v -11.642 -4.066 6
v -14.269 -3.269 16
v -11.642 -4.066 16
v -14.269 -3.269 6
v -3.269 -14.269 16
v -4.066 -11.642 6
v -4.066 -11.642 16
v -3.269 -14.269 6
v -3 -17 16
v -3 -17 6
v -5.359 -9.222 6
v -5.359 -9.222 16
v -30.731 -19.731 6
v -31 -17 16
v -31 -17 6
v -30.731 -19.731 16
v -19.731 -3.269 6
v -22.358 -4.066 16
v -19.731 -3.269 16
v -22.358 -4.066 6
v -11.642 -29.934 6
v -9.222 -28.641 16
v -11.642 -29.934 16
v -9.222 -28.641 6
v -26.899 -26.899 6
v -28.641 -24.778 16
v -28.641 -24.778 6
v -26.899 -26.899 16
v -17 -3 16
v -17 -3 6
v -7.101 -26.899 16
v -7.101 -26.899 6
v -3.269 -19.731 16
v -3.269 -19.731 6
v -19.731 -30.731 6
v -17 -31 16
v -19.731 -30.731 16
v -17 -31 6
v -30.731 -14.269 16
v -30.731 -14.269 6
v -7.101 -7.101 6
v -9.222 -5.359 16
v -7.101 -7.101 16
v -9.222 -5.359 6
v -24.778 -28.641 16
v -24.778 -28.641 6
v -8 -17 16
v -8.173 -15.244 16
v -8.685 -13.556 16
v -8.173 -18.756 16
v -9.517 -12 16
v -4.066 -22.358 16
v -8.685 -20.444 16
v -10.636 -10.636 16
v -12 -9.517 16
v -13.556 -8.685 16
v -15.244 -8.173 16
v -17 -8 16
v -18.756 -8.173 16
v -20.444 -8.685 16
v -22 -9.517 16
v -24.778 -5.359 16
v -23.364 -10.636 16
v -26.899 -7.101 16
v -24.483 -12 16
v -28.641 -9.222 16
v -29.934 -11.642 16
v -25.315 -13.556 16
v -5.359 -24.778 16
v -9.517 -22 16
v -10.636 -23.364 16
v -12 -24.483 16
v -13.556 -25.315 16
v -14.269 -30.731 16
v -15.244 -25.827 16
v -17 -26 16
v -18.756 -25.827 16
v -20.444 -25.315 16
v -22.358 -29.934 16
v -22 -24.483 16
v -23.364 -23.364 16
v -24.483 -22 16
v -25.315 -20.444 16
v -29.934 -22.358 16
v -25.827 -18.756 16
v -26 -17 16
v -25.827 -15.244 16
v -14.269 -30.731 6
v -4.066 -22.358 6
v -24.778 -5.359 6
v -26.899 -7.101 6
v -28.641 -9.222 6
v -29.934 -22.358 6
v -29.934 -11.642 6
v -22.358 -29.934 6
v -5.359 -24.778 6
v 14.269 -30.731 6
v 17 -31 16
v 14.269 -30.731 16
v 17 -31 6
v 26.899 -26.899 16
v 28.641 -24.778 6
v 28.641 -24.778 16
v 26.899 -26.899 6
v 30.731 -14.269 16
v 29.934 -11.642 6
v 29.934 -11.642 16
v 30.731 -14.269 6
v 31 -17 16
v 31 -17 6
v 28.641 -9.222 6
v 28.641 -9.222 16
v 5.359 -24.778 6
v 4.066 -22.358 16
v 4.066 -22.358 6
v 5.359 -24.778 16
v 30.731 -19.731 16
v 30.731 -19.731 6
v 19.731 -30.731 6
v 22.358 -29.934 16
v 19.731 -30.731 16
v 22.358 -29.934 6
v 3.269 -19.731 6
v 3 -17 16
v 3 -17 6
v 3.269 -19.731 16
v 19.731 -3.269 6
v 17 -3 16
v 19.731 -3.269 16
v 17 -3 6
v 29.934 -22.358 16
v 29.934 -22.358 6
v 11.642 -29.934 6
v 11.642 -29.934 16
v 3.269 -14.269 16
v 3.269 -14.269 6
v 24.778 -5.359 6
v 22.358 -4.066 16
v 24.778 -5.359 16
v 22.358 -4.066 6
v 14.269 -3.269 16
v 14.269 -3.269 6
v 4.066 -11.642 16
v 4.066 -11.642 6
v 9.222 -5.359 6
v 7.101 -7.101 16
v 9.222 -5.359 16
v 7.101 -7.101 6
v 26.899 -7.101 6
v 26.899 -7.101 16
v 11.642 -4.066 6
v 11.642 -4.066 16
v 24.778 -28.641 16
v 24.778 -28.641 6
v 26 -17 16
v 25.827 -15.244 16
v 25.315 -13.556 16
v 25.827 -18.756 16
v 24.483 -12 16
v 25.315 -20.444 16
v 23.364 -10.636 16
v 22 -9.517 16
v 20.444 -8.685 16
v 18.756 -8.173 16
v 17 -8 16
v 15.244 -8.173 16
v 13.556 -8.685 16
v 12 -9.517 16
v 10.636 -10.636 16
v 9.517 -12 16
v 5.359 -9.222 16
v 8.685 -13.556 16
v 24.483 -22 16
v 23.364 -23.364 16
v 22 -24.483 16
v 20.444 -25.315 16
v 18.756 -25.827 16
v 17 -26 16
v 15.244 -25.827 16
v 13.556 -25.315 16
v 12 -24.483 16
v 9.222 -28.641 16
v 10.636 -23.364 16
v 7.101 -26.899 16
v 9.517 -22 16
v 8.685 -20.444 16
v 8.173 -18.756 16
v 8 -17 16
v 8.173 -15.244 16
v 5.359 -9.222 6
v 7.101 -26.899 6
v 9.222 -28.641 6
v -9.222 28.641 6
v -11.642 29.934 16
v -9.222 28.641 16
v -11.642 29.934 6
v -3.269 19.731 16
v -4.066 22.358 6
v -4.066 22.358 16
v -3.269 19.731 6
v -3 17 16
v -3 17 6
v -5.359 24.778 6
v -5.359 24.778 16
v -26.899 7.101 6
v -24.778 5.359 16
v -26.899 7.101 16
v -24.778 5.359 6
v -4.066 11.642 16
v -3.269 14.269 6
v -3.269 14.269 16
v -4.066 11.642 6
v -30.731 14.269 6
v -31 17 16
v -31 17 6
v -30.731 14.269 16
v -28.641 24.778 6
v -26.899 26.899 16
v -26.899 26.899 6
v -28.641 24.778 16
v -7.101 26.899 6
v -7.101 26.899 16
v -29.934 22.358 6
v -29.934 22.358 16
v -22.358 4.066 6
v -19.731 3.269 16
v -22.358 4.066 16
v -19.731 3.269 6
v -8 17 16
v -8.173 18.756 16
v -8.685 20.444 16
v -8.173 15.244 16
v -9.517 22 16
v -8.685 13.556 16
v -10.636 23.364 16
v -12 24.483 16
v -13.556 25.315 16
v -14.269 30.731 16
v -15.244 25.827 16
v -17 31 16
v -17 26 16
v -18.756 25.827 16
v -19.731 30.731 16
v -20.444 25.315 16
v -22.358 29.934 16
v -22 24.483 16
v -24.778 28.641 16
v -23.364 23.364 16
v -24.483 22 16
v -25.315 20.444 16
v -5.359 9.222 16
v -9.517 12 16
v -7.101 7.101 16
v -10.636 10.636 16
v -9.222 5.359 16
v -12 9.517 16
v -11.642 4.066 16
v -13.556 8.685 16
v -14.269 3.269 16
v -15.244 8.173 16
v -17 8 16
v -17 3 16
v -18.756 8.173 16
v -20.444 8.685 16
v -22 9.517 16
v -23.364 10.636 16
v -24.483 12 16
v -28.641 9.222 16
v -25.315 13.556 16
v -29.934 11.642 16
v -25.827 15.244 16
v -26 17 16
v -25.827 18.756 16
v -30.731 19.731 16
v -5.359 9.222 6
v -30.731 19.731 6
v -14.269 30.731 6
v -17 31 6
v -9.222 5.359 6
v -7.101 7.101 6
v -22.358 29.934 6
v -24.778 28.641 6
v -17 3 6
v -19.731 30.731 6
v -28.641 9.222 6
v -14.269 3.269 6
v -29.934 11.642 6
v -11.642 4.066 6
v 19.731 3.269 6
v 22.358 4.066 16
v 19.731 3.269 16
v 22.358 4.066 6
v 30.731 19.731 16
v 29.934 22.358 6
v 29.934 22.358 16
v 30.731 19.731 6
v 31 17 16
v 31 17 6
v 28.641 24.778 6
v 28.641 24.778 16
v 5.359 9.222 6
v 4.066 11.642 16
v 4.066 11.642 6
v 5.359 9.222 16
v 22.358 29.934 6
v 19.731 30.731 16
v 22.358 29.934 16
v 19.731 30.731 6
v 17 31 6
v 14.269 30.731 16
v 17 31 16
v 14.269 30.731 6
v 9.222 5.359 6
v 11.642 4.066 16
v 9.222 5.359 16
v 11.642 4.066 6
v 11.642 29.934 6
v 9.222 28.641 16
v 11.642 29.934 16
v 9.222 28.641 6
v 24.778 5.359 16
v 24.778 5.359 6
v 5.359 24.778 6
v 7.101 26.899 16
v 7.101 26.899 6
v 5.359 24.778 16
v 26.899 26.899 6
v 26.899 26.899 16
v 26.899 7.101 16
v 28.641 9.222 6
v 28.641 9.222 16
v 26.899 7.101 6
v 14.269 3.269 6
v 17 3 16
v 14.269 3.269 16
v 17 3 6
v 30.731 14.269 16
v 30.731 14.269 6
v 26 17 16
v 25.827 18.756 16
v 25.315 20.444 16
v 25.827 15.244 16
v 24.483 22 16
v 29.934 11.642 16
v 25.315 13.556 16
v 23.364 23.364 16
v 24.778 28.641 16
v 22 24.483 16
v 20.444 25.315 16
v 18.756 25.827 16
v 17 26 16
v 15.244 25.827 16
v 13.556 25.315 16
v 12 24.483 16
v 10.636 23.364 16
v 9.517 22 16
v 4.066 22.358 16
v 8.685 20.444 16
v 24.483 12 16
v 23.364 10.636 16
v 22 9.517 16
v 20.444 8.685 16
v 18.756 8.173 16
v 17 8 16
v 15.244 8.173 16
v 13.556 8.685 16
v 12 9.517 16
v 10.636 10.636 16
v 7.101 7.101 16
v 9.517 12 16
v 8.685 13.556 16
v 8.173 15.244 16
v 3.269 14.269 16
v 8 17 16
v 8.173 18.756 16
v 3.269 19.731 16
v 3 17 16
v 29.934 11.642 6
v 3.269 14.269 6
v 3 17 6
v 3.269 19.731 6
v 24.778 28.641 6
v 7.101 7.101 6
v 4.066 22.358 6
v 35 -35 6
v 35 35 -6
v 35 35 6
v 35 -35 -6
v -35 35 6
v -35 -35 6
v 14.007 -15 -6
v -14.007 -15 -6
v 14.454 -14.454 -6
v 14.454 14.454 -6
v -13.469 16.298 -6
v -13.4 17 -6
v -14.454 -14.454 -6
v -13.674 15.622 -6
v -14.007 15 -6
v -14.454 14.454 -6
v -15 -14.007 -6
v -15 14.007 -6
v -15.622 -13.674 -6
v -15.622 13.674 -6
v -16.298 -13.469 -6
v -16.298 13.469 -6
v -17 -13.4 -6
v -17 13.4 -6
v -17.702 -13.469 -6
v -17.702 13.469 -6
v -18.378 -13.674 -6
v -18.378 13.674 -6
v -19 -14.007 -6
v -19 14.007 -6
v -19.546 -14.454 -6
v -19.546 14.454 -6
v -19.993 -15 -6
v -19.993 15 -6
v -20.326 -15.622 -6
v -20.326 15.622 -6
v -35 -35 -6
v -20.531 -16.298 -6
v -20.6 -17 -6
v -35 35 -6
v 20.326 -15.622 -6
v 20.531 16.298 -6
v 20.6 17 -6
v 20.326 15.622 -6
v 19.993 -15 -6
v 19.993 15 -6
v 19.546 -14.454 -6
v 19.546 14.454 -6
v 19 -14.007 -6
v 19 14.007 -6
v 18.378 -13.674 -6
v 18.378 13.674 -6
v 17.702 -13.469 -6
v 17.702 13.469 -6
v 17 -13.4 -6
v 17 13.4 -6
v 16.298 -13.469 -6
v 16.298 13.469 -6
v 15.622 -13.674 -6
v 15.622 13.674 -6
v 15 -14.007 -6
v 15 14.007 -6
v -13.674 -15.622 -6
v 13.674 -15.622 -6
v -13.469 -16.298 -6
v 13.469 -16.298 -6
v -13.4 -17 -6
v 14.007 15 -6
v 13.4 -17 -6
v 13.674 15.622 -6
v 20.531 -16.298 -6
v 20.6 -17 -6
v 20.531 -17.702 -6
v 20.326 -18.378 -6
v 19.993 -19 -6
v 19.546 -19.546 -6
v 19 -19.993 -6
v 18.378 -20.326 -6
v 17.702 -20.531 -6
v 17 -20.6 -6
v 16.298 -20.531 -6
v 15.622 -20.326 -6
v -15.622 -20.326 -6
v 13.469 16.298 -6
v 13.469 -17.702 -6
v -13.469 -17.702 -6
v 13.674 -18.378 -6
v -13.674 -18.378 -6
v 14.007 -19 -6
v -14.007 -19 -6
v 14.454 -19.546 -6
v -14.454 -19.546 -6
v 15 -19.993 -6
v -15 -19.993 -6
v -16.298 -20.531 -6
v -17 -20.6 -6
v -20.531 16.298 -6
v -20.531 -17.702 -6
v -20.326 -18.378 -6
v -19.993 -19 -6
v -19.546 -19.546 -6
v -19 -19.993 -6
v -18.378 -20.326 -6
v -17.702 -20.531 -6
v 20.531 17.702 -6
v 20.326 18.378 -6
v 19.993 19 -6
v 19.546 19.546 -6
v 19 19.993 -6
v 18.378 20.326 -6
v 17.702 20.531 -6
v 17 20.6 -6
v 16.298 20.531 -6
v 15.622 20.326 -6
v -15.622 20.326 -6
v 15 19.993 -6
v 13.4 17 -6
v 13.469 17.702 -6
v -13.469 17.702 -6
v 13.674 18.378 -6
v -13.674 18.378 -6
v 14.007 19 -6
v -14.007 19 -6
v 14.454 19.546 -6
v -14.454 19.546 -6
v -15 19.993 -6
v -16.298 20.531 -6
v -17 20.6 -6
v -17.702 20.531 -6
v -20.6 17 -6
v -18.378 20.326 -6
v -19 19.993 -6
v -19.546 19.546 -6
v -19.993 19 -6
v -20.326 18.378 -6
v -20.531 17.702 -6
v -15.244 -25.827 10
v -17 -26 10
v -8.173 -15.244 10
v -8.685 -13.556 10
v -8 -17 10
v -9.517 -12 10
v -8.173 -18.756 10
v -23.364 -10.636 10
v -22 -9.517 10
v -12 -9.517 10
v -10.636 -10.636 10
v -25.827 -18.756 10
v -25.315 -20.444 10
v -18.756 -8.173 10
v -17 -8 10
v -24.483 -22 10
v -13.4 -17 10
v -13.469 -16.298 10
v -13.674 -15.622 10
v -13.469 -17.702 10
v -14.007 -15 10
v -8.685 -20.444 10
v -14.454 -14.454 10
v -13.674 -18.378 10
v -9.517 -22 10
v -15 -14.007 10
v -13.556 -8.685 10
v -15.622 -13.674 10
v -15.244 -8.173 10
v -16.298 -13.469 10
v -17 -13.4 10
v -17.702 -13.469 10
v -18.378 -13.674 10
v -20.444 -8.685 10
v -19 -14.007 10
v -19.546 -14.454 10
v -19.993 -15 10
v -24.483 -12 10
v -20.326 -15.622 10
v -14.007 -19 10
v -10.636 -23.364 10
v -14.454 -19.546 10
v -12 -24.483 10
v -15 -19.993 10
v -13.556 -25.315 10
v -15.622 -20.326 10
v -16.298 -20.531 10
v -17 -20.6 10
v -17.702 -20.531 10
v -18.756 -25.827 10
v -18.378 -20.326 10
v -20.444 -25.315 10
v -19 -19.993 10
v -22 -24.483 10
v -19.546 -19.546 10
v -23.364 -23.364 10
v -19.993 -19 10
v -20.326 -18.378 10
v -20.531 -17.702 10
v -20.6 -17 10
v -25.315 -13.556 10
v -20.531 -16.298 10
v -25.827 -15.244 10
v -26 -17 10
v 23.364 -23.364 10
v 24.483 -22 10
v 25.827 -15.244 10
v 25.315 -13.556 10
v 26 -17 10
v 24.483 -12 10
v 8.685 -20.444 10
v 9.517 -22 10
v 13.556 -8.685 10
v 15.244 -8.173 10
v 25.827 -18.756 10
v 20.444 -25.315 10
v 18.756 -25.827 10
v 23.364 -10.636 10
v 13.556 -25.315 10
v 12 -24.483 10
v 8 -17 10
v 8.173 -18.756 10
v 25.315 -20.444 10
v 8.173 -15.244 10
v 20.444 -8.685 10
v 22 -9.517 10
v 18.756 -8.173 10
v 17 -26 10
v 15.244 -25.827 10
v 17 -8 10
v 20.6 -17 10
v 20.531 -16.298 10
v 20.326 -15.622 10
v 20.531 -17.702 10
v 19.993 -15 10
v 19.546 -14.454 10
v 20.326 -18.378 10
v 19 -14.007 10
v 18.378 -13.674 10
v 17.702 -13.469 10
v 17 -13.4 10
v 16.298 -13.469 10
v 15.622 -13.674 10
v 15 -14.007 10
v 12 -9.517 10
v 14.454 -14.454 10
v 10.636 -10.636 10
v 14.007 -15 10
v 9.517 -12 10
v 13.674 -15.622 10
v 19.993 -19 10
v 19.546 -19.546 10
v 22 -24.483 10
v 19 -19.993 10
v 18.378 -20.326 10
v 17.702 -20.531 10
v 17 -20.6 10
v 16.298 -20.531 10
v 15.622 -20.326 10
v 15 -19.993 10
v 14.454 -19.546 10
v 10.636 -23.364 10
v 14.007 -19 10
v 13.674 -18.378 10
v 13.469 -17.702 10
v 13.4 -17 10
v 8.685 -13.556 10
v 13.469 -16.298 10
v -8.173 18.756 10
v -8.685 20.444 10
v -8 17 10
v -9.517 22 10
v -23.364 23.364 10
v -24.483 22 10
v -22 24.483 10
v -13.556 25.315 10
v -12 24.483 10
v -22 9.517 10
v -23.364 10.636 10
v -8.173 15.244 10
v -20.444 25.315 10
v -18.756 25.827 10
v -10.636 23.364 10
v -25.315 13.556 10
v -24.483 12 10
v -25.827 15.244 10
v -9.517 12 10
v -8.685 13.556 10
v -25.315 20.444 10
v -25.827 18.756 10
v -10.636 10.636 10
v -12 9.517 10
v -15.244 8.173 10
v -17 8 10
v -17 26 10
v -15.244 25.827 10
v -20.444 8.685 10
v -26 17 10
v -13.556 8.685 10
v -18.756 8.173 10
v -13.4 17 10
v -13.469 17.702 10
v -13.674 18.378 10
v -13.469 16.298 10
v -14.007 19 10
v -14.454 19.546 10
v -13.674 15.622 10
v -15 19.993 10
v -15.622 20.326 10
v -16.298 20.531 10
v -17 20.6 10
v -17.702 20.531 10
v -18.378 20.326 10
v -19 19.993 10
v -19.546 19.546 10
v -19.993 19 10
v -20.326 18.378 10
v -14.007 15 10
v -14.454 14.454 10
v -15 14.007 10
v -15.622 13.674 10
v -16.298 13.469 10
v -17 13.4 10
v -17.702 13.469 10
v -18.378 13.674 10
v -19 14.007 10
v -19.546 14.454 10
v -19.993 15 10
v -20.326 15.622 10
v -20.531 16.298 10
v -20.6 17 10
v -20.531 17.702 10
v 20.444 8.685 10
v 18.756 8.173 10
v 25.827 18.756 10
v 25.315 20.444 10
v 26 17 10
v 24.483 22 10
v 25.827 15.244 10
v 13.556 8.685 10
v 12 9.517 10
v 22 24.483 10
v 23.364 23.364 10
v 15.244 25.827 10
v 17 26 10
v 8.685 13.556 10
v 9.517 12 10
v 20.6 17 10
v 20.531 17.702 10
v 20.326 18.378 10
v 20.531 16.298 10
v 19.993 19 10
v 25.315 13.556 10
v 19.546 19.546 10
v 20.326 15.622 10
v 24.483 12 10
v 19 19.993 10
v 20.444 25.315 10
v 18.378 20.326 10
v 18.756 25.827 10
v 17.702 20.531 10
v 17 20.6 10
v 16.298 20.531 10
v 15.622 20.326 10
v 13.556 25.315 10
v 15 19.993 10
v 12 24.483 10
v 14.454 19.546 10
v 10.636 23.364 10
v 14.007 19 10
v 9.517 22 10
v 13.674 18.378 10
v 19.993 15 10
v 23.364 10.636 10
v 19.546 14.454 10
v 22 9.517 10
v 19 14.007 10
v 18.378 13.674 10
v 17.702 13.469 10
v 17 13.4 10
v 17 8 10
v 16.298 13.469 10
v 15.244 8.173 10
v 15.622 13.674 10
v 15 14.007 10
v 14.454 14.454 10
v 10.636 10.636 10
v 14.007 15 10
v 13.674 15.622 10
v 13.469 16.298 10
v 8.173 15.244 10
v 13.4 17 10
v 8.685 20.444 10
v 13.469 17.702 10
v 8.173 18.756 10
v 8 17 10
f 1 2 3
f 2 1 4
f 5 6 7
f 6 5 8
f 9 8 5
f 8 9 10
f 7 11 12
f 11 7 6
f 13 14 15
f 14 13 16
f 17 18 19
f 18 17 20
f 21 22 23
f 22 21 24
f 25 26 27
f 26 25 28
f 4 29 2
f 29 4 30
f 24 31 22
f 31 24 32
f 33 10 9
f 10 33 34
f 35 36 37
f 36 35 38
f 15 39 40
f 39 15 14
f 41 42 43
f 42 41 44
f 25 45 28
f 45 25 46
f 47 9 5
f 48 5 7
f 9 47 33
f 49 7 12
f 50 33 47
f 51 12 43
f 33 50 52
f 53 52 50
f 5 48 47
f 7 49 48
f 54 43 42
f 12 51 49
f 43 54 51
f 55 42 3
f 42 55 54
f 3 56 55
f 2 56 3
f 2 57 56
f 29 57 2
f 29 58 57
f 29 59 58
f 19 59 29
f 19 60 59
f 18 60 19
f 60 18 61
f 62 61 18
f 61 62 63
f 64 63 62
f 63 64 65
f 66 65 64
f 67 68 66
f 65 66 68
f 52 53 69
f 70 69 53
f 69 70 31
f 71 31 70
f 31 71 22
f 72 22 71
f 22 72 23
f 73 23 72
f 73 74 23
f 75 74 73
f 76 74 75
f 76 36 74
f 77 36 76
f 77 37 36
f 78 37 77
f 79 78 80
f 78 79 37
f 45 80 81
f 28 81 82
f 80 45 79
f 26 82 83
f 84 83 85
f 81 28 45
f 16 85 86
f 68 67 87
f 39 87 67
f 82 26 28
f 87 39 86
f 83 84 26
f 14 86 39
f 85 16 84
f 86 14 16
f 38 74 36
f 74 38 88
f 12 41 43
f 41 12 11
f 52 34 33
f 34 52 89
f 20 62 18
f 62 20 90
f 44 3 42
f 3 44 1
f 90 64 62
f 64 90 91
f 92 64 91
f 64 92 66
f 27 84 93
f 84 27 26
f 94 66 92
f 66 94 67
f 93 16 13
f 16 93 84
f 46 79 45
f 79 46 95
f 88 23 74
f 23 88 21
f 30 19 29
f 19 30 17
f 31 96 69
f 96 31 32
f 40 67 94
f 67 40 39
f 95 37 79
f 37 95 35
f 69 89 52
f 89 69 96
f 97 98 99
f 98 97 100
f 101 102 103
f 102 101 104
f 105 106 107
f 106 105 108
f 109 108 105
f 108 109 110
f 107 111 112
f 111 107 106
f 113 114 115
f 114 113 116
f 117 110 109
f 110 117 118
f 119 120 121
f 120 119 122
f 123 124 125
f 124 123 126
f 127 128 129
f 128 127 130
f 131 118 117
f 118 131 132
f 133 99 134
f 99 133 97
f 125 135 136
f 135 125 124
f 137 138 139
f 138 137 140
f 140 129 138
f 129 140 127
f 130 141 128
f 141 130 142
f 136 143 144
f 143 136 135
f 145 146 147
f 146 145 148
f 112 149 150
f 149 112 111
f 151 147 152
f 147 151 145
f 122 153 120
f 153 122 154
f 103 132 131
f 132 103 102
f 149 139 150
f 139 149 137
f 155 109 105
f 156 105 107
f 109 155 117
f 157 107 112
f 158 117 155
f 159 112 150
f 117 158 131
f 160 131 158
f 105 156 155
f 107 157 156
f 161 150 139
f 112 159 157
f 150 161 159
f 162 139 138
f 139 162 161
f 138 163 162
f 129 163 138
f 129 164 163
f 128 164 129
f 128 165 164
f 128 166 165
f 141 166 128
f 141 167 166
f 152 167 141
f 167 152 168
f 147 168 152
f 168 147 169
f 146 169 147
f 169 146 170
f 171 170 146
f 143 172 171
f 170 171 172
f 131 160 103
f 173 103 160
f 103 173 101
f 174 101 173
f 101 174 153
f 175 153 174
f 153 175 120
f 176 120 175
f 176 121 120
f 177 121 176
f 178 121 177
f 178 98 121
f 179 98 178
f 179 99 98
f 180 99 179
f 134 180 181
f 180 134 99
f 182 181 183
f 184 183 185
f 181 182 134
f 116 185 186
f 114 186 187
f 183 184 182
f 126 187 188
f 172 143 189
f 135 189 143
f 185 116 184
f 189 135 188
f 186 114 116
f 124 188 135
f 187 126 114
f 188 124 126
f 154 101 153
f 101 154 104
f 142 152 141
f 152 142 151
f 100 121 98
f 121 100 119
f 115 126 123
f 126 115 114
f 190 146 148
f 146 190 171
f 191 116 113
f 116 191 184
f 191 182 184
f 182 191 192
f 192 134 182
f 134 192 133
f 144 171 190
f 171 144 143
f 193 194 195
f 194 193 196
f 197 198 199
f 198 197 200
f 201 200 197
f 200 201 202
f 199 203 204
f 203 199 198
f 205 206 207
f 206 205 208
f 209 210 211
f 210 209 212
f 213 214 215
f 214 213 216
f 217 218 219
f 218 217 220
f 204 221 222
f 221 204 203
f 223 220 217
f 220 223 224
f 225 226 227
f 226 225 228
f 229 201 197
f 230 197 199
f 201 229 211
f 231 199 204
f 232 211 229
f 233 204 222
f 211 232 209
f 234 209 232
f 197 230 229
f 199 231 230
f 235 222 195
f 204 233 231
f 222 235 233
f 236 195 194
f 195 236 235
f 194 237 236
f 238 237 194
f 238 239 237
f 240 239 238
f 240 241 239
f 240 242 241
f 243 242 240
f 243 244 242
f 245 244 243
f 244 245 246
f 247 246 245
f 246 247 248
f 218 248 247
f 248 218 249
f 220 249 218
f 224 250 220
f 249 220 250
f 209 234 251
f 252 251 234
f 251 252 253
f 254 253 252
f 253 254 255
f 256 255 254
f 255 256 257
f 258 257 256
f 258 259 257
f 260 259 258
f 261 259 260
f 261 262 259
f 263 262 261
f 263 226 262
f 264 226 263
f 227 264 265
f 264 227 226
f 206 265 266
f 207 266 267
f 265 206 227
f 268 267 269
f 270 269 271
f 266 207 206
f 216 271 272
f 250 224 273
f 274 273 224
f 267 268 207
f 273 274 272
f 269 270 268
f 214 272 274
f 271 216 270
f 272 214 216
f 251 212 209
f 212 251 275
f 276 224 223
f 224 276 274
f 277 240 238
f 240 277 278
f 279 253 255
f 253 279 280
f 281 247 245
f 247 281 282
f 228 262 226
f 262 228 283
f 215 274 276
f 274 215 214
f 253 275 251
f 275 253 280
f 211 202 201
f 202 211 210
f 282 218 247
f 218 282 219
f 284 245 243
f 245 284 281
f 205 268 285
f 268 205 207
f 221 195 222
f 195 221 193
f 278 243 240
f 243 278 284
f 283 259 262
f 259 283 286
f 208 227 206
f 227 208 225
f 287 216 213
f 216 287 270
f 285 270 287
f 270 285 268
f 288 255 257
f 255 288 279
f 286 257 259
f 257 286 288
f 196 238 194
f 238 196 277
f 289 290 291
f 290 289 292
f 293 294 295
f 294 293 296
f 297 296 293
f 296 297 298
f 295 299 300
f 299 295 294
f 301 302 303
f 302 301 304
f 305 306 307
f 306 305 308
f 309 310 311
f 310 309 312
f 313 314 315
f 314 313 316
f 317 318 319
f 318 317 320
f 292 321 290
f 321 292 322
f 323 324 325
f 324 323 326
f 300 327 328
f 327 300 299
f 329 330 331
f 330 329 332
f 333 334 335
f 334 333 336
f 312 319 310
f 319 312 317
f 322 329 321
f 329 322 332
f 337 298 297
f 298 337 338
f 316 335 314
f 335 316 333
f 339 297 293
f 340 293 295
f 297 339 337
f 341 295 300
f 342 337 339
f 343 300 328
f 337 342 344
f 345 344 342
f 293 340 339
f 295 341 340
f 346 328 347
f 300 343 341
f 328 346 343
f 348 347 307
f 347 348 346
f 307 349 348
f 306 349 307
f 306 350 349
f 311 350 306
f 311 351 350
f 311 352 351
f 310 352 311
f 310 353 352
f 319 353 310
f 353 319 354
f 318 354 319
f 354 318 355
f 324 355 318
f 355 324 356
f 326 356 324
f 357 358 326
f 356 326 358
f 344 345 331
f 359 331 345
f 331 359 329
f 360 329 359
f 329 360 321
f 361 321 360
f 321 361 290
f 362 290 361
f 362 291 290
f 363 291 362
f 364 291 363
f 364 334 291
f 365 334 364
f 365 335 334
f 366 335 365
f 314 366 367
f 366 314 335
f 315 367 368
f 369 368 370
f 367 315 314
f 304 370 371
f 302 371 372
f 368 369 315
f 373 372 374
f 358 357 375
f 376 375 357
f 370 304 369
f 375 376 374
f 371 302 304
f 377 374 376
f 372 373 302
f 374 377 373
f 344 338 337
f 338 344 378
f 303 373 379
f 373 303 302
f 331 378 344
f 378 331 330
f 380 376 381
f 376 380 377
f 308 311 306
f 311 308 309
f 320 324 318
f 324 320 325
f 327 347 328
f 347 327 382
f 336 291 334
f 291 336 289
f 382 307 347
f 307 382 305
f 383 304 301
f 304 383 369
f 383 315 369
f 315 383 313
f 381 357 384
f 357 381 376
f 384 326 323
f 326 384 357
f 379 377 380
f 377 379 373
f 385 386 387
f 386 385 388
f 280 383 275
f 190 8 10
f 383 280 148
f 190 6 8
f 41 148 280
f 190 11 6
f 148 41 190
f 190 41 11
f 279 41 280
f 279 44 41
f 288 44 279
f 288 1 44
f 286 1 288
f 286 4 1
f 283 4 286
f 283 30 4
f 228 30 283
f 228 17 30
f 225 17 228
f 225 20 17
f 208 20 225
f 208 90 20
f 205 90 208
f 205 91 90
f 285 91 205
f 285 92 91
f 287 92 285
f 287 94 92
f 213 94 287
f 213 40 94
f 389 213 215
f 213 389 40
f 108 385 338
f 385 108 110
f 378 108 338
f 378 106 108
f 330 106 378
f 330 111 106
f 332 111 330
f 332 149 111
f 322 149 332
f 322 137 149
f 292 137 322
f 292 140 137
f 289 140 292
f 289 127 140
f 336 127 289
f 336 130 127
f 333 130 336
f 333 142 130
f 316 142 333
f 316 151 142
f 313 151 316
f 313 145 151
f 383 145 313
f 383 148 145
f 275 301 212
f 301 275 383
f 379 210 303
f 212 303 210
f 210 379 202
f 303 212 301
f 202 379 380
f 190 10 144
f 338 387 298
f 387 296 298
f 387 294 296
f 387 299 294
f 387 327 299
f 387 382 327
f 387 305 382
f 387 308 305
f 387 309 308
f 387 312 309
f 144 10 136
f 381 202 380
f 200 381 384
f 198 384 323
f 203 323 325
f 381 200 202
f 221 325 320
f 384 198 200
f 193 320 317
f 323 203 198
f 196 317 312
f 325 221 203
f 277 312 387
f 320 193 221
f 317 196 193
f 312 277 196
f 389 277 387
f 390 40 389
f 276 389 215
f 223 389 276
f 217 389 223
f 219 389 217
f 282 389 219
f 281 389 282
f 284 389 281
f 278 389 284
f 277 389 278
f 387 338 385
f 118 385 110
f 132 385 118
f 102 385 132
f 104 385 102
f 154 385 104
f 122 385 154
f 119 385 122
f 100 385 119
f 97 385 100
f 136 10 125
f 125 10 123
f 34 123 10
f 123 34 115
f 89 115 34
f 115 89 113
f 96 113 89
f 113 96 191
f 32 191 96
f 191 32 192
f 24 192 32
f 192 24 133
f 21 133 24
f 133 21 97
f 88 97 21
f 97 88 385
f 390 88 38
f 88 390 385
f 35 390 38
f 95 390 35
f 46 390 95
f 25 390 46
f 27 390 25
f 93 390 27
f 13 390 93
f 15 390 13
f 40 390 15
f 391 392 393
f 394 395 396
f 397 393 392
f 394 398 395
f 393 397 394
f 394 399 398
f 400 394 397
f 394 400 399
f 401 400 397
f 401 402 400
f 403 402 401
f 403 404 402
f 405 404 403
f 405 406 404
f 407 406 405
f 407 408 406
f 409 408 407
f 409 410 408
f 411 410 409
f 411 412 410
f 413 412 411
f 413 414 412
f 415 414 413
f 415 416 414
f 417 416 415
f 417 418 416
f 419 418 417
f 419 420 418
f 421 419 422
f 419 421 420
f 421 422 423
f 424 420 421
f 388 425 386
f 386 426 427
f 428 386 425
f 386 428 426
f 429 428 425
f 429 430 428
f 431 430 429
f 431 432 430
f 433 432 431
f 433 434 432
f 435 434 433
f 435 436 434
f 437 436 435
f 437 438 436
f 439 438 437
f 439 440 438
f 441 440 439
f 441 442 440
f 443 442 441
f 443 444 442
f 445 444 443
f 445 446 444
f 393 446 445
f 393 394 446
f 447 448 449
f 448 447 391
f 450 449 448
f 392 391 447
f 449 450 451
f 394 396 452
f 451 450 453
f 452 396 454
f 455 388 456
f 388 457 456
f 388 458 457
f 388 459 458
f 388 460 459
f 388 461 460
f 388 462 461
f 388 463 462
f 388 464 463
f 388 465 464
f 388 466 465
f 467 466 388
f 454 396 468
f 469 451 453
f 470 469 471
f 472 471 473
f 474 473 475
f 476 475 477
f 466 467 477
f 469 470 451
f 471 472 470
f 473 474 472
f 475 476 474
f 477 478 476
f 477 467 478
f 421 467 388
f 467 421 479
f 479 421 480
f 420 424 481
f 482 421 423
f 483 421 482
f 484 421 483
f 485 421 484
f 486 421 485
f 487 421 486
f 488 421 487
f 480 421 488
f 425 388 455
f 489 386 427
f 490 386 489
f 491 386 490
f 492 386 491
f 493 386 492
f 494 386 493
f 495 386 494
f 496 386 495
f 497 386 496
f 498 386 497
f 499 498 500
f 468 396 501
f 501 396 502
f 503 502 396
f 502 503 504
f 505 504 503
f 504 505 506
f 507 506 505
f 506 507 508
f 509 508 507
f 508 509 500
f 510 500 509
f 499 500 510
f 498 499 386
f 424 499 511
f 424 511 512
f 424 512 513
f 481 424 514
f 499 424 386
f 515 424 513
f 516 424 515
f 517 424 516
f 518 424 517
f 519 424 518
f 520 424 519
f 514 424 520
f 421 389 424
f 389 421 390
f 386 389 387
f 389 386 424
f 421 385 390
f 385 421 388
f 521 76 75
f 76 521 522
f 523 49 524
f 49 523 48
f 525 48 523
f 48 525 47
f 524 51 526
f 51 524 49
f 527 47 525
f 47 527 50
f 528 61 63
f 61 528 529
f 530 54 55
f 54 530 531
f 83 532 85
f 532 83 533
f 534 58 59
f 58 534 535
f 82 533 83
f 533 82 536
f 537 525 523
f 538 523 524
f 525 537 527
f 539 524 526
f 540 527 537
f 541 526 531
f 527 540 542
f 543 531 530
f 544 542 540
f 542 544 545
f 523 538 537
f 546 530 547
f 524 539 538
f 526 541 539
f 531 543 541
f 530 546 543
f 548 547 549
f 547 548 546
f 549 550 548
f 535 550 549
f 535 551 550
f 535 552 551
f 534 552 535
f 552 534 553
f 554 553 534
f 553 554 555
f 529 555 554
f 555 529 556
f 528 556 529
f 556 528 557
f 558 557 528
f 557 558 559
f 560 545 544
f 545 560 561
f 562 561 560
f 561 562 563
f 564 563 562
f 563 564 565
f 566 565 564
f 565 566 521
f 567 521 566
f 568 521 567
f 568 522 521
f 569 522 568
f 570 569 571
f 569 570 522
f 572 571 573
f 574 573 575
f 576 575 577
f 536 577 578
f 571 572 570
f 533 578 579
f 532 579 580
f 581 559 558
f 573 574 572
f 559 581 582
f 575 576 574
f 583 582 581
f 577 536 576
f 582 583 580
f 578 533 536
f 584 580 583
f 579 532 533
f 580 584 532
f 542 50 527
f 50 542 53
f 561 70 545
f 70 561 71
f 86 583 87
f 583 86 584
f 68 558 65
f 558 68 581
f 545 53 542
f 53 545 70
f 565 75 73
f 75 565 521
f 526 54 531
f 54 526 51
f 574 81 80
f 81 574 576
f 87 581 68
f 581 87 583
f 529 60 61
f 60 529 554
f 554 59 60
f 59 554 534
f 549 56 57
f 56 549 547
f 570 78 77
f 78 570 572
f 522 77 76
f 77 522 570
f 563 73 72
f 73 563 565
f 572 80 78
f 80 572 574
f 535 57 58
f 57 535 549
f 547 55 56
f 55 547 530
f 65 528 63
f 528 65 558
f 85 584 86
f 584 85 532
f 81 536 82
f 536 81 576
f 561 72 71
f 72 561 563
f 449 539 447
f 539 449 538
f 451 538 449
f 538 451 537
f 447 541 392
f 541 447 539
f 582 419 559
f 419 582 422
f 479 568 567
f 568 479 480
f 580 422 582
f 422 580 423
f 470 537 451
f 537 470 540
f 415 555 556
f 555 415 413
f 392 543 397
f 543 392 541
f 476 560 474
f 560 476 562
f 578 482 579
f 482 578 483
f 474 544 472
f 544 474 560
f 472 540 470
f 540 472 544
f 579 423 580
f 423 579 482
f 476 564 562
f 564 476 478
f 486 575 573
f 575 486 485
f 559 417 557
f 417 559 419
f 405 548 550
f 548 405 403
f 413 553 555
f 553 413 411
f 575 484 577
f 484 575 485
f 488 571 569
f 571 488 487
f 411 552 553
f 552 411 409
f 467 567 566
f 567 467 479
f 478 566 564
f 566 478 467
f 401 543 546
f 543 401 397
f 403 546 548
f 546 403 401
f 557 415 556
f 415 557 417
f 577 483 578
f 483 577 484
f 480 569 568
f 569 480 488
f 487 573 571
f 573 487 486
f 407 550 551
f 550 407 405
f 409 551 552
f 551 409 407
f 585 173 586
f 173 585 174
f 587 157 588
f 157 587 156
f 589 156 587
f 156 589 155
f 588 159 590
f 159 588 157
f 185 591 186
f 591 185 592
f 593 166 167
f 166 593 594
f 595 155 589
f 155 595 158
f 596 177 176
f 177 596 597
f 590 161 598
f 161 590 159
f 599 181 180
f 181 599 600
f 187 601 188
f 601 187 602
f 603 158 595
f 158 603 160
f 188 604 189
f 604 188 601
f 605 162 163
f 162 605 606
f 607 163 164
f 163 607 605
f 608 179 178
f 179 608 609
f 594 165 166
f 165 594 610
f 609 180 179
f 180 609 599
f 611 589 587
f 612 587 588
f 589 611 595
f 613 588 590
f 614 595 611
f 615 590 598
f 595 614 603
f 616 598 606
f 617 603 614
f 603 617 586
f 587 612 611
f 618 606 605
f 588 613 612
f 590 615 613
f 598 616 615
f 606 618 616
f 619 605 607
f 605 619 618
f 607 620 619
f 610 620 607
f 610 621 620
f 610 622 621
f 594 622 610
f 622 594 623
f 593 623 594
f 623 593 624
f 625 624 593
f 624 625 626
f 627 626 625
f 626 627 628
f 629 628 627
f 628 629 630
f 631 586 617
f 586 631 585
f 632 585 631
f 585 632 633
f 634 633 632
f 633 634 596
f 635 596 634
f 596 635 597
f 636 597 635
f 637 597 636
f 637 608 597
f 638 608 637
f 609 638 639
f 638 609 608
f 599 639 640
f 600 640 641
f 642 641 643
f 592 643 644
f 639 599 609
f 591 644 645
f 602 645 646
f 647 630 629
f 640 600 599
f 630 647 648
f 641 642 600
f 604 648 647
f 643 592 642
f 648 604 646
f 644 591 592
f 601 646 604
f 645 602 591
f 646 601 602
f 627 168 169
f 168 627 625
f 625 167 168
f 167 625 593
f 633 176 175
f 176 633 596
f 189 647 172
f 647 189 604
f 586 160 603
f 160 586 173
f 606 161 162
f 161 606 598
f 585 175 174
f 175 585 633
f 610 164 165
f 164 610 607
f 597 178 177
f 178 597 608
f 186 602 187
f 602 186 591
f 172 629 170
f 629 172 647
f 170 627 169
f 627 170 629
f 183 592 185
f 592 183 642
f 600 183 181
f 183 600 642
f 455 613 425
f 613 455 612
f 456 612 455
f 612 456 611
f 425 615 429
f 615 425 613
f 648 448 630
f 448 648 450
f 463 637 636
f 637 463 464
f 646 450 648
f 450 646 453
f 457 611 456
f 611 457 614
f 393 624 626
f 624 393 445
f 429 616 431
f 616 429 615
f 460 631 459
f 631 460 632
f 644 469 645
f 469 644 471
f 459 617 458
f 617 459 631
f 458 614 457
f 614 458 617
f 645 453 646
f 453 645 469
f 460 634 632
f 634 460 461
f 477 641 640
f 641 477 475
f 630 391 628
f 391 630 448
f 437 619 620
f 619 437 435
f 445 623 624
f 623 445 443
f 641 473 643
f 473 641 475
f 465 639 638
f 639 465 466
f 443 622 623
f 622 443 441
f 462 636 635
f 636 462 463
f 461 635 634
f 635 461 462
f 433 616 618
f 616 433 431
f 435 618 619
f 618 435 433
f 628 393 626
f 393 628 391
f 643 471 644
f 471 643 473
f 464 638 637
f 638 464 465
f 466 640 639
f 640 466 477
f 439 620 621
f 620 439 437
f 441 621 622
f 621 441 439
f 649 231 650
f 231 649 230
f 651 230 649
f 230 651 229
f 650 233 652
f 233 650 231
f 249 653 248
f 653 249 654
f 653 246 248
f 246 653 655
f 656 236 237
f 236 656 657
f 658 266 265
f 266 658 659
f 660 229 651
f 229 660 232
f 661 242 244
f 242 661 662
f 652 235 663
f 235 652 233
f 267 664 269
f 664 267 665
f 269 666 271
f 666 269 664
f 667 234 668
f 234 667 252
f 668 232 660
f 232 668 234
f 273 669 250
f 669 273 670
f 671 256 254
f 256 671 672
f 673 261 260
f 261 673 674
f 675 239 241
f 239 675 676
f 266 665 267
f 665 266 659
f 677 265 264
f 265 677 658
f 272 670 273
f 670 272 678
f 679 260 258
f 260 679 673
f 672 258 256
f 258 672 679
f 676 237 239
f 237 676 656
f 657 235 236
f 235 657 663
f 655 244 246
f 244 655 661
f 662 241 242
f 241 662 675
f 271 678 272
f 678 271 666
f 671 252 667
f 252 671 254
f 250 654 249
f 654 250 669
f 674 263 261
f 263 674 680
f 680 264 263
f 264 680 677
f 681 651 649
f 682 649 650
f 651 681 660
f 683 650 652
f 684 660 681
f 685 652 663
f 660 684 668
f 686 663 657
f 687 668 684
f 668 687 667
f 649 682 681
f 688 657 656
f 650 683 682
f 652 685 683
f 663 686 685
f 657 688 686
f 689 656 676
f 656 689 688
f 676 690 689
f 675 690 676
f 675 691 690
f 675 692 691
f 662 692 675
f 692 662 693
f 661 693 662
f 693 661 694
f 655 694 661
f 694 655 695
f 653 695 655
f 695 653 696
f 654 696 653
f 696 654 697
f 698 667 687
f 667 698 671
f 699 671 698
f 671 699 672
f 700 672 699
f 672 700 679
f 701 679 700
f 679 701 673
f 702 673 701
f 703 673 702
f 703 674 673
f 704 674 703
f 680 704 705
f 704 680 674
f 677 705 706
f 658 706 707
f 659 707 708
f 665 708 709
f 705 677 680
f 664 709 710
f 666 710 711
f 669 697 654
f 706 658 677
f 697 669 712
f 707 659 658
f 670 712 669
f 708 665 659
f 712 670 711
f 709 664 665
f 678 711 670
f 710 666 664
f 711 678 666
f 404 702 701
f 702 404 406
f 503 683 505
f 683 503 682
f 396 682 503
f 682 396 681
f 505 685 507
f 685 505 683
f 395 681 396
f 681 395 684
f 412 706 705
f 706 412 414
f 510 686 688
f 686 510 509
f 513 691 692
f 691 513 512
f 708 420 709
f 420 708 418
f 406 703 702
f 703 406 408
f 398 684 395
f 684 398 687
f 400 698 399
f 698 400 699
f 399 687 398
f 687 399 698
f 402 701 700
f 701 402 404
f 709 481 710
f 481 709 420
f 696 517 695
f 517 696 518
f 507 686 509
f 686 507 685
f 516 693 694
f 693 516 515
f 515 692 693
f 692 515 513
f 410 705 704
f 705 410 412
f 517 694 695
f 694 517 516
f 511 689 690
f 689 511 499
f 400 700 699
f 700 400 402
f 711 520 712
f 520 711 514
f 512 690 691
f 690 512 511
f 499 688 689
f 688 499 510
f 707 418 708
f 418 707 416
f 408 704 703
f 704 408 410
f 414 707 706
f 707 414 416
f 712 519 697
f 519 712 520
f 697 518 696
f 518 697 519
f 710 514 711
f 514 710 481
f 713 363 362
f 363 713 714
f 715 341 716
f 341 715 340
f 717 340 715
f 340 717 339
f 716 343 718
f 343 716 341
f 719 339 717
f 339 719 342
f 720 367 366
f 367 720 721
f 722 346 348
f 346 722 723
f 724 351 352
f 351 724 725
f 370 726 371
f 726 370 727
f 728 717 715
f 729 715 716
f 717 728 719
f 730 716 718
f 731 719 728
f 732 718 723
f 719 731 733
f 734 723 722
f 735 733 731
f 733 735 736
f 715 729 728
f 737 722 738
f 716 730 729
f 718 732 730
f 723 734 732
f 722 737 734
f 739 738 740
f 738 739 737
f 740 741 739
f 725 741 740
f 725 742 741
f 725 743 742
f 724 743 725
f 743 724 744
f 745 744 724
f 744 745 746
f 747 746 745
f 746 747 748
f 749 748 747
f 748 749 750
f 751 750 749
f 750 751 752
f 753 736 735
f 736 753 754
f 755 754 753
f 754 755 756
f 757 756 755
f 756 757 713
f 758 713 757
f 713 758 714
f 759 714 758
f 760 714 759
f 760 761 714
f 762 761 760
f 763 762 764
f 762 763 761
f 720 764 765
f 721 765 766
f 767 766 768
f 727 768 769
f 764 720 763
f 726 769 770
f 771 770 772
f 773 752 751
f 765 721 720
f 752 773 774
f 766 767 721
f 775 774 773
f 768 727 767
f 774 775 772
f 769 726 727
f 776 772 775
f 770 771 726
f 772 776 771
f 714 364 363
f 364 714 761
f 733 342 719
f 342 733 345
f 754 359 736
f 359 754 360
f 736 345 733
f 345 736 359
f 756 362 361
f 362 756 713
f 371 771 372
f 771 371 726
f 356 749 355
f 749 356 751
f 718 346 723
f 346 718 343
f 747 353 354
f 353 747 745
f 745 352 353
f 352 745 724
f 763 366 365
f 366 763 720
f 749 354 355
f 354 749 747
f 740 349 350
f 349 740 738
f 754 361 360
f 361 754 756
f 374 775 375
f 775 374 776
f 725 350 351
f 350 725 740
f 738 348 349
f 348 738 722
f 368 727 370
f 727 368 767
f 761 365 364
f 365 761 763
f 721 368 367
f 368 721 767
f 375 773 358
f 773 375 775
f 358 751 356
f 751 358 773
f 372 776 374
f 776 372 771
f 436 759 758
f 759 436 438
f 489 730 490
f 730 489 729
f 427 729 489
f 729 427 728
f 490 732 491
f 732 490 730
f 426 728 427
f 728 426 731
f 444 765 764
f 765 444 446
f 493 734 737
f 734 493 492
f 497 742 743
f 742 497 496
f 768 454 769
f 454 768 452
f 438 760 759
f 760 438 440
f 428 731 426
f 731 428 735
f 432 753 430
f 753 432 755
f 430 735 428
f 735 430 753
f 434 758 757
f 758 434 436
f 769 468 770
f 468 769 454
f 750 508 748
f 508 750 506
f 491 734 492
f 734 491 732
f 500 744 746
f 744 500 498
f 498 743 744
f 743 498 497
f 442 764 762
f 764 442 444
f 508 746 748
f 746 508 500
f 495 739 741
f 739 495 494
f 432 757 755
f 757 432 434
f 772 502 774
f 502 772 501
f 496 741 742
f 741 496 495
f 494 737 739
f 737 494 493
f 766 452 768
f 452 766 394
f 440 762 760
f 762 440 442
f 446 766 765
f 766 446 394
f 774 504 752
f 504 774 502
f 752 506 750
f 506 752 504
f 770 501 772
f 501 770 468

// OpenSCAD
$fn = 32;

// ----------------------------------------------------------------------
// Socket pad plate
// bosses with counterbored sockets for the screws
// ----------------------------------------------------------------------

// --- parameters (mm) ---
base_t = 12;       // base plate thickness
boss_h = 10;       // boss height above the base plate
boss_d = 28;       // boss diameter
socket_d = 18;     // socket diameter
socket_depth = 6;  // socket depth from the boss face
bolt_d = 7.2;      // screw clearance hole through the socket floor
rows = 2;          // boss rows
cols = 2;          // bosses per row
pitch = 34;        // boss pitch

// --- derived feature positions (mm) ---
height = base_t + boss_h;           // = 22   overall height of the part
plate = [pitch * (cols - 1) + boss_d + 8, pitch * (rows - 1) + boss_d + 8, base_t];  // = [70, 70, 12]   overall size (x, y, z)
span_x = pitch * (cols - 1);        // = 34   distance between outer bosses
span_y = pitch * (rows - 1);        // = 34   distance between boss rows
origin_x = -span_x / 2;             // = -17   X of the first boss
origin_y = -span_y / 2;             // = -17   Y of the first boss
feature_centers = [
  [origin_x + 0 * pitch, origin_y + 0 * pitch],
  [origin_x + 1 * pitch, origin_y + 0 * pitch],
  [origin_x + 0 * pitch, origin_y + 1 * pitch],
  [origin_x + 1 * pitch, origin_y + 1 * pitch]
];   // boss centres: sockets, holes and the pads themselves are placed from here

// base plate, bosses on feature_centers, socket + through hole in each
difference() {
  union() {
    cube(plate, center = true);
    for (centre = feature_centers)
      translate([centre[0], centre[1], plate[2] / 2 - 1])
        cylinder(d = boss_d, h = boss_h + 1);
  }
  for (centre = feature_centers) {
    translate([centre[0], centre[1], plate[2] / 2 + boss_h - socket_depth])
      cylinder(d = socket_d, h = socket_depth + 1);
    translate([centre[0], centre[1], -height])
      cylinder(d = bolt_d, h = 2 * height + 2);  // through the socket floor
  }
}
